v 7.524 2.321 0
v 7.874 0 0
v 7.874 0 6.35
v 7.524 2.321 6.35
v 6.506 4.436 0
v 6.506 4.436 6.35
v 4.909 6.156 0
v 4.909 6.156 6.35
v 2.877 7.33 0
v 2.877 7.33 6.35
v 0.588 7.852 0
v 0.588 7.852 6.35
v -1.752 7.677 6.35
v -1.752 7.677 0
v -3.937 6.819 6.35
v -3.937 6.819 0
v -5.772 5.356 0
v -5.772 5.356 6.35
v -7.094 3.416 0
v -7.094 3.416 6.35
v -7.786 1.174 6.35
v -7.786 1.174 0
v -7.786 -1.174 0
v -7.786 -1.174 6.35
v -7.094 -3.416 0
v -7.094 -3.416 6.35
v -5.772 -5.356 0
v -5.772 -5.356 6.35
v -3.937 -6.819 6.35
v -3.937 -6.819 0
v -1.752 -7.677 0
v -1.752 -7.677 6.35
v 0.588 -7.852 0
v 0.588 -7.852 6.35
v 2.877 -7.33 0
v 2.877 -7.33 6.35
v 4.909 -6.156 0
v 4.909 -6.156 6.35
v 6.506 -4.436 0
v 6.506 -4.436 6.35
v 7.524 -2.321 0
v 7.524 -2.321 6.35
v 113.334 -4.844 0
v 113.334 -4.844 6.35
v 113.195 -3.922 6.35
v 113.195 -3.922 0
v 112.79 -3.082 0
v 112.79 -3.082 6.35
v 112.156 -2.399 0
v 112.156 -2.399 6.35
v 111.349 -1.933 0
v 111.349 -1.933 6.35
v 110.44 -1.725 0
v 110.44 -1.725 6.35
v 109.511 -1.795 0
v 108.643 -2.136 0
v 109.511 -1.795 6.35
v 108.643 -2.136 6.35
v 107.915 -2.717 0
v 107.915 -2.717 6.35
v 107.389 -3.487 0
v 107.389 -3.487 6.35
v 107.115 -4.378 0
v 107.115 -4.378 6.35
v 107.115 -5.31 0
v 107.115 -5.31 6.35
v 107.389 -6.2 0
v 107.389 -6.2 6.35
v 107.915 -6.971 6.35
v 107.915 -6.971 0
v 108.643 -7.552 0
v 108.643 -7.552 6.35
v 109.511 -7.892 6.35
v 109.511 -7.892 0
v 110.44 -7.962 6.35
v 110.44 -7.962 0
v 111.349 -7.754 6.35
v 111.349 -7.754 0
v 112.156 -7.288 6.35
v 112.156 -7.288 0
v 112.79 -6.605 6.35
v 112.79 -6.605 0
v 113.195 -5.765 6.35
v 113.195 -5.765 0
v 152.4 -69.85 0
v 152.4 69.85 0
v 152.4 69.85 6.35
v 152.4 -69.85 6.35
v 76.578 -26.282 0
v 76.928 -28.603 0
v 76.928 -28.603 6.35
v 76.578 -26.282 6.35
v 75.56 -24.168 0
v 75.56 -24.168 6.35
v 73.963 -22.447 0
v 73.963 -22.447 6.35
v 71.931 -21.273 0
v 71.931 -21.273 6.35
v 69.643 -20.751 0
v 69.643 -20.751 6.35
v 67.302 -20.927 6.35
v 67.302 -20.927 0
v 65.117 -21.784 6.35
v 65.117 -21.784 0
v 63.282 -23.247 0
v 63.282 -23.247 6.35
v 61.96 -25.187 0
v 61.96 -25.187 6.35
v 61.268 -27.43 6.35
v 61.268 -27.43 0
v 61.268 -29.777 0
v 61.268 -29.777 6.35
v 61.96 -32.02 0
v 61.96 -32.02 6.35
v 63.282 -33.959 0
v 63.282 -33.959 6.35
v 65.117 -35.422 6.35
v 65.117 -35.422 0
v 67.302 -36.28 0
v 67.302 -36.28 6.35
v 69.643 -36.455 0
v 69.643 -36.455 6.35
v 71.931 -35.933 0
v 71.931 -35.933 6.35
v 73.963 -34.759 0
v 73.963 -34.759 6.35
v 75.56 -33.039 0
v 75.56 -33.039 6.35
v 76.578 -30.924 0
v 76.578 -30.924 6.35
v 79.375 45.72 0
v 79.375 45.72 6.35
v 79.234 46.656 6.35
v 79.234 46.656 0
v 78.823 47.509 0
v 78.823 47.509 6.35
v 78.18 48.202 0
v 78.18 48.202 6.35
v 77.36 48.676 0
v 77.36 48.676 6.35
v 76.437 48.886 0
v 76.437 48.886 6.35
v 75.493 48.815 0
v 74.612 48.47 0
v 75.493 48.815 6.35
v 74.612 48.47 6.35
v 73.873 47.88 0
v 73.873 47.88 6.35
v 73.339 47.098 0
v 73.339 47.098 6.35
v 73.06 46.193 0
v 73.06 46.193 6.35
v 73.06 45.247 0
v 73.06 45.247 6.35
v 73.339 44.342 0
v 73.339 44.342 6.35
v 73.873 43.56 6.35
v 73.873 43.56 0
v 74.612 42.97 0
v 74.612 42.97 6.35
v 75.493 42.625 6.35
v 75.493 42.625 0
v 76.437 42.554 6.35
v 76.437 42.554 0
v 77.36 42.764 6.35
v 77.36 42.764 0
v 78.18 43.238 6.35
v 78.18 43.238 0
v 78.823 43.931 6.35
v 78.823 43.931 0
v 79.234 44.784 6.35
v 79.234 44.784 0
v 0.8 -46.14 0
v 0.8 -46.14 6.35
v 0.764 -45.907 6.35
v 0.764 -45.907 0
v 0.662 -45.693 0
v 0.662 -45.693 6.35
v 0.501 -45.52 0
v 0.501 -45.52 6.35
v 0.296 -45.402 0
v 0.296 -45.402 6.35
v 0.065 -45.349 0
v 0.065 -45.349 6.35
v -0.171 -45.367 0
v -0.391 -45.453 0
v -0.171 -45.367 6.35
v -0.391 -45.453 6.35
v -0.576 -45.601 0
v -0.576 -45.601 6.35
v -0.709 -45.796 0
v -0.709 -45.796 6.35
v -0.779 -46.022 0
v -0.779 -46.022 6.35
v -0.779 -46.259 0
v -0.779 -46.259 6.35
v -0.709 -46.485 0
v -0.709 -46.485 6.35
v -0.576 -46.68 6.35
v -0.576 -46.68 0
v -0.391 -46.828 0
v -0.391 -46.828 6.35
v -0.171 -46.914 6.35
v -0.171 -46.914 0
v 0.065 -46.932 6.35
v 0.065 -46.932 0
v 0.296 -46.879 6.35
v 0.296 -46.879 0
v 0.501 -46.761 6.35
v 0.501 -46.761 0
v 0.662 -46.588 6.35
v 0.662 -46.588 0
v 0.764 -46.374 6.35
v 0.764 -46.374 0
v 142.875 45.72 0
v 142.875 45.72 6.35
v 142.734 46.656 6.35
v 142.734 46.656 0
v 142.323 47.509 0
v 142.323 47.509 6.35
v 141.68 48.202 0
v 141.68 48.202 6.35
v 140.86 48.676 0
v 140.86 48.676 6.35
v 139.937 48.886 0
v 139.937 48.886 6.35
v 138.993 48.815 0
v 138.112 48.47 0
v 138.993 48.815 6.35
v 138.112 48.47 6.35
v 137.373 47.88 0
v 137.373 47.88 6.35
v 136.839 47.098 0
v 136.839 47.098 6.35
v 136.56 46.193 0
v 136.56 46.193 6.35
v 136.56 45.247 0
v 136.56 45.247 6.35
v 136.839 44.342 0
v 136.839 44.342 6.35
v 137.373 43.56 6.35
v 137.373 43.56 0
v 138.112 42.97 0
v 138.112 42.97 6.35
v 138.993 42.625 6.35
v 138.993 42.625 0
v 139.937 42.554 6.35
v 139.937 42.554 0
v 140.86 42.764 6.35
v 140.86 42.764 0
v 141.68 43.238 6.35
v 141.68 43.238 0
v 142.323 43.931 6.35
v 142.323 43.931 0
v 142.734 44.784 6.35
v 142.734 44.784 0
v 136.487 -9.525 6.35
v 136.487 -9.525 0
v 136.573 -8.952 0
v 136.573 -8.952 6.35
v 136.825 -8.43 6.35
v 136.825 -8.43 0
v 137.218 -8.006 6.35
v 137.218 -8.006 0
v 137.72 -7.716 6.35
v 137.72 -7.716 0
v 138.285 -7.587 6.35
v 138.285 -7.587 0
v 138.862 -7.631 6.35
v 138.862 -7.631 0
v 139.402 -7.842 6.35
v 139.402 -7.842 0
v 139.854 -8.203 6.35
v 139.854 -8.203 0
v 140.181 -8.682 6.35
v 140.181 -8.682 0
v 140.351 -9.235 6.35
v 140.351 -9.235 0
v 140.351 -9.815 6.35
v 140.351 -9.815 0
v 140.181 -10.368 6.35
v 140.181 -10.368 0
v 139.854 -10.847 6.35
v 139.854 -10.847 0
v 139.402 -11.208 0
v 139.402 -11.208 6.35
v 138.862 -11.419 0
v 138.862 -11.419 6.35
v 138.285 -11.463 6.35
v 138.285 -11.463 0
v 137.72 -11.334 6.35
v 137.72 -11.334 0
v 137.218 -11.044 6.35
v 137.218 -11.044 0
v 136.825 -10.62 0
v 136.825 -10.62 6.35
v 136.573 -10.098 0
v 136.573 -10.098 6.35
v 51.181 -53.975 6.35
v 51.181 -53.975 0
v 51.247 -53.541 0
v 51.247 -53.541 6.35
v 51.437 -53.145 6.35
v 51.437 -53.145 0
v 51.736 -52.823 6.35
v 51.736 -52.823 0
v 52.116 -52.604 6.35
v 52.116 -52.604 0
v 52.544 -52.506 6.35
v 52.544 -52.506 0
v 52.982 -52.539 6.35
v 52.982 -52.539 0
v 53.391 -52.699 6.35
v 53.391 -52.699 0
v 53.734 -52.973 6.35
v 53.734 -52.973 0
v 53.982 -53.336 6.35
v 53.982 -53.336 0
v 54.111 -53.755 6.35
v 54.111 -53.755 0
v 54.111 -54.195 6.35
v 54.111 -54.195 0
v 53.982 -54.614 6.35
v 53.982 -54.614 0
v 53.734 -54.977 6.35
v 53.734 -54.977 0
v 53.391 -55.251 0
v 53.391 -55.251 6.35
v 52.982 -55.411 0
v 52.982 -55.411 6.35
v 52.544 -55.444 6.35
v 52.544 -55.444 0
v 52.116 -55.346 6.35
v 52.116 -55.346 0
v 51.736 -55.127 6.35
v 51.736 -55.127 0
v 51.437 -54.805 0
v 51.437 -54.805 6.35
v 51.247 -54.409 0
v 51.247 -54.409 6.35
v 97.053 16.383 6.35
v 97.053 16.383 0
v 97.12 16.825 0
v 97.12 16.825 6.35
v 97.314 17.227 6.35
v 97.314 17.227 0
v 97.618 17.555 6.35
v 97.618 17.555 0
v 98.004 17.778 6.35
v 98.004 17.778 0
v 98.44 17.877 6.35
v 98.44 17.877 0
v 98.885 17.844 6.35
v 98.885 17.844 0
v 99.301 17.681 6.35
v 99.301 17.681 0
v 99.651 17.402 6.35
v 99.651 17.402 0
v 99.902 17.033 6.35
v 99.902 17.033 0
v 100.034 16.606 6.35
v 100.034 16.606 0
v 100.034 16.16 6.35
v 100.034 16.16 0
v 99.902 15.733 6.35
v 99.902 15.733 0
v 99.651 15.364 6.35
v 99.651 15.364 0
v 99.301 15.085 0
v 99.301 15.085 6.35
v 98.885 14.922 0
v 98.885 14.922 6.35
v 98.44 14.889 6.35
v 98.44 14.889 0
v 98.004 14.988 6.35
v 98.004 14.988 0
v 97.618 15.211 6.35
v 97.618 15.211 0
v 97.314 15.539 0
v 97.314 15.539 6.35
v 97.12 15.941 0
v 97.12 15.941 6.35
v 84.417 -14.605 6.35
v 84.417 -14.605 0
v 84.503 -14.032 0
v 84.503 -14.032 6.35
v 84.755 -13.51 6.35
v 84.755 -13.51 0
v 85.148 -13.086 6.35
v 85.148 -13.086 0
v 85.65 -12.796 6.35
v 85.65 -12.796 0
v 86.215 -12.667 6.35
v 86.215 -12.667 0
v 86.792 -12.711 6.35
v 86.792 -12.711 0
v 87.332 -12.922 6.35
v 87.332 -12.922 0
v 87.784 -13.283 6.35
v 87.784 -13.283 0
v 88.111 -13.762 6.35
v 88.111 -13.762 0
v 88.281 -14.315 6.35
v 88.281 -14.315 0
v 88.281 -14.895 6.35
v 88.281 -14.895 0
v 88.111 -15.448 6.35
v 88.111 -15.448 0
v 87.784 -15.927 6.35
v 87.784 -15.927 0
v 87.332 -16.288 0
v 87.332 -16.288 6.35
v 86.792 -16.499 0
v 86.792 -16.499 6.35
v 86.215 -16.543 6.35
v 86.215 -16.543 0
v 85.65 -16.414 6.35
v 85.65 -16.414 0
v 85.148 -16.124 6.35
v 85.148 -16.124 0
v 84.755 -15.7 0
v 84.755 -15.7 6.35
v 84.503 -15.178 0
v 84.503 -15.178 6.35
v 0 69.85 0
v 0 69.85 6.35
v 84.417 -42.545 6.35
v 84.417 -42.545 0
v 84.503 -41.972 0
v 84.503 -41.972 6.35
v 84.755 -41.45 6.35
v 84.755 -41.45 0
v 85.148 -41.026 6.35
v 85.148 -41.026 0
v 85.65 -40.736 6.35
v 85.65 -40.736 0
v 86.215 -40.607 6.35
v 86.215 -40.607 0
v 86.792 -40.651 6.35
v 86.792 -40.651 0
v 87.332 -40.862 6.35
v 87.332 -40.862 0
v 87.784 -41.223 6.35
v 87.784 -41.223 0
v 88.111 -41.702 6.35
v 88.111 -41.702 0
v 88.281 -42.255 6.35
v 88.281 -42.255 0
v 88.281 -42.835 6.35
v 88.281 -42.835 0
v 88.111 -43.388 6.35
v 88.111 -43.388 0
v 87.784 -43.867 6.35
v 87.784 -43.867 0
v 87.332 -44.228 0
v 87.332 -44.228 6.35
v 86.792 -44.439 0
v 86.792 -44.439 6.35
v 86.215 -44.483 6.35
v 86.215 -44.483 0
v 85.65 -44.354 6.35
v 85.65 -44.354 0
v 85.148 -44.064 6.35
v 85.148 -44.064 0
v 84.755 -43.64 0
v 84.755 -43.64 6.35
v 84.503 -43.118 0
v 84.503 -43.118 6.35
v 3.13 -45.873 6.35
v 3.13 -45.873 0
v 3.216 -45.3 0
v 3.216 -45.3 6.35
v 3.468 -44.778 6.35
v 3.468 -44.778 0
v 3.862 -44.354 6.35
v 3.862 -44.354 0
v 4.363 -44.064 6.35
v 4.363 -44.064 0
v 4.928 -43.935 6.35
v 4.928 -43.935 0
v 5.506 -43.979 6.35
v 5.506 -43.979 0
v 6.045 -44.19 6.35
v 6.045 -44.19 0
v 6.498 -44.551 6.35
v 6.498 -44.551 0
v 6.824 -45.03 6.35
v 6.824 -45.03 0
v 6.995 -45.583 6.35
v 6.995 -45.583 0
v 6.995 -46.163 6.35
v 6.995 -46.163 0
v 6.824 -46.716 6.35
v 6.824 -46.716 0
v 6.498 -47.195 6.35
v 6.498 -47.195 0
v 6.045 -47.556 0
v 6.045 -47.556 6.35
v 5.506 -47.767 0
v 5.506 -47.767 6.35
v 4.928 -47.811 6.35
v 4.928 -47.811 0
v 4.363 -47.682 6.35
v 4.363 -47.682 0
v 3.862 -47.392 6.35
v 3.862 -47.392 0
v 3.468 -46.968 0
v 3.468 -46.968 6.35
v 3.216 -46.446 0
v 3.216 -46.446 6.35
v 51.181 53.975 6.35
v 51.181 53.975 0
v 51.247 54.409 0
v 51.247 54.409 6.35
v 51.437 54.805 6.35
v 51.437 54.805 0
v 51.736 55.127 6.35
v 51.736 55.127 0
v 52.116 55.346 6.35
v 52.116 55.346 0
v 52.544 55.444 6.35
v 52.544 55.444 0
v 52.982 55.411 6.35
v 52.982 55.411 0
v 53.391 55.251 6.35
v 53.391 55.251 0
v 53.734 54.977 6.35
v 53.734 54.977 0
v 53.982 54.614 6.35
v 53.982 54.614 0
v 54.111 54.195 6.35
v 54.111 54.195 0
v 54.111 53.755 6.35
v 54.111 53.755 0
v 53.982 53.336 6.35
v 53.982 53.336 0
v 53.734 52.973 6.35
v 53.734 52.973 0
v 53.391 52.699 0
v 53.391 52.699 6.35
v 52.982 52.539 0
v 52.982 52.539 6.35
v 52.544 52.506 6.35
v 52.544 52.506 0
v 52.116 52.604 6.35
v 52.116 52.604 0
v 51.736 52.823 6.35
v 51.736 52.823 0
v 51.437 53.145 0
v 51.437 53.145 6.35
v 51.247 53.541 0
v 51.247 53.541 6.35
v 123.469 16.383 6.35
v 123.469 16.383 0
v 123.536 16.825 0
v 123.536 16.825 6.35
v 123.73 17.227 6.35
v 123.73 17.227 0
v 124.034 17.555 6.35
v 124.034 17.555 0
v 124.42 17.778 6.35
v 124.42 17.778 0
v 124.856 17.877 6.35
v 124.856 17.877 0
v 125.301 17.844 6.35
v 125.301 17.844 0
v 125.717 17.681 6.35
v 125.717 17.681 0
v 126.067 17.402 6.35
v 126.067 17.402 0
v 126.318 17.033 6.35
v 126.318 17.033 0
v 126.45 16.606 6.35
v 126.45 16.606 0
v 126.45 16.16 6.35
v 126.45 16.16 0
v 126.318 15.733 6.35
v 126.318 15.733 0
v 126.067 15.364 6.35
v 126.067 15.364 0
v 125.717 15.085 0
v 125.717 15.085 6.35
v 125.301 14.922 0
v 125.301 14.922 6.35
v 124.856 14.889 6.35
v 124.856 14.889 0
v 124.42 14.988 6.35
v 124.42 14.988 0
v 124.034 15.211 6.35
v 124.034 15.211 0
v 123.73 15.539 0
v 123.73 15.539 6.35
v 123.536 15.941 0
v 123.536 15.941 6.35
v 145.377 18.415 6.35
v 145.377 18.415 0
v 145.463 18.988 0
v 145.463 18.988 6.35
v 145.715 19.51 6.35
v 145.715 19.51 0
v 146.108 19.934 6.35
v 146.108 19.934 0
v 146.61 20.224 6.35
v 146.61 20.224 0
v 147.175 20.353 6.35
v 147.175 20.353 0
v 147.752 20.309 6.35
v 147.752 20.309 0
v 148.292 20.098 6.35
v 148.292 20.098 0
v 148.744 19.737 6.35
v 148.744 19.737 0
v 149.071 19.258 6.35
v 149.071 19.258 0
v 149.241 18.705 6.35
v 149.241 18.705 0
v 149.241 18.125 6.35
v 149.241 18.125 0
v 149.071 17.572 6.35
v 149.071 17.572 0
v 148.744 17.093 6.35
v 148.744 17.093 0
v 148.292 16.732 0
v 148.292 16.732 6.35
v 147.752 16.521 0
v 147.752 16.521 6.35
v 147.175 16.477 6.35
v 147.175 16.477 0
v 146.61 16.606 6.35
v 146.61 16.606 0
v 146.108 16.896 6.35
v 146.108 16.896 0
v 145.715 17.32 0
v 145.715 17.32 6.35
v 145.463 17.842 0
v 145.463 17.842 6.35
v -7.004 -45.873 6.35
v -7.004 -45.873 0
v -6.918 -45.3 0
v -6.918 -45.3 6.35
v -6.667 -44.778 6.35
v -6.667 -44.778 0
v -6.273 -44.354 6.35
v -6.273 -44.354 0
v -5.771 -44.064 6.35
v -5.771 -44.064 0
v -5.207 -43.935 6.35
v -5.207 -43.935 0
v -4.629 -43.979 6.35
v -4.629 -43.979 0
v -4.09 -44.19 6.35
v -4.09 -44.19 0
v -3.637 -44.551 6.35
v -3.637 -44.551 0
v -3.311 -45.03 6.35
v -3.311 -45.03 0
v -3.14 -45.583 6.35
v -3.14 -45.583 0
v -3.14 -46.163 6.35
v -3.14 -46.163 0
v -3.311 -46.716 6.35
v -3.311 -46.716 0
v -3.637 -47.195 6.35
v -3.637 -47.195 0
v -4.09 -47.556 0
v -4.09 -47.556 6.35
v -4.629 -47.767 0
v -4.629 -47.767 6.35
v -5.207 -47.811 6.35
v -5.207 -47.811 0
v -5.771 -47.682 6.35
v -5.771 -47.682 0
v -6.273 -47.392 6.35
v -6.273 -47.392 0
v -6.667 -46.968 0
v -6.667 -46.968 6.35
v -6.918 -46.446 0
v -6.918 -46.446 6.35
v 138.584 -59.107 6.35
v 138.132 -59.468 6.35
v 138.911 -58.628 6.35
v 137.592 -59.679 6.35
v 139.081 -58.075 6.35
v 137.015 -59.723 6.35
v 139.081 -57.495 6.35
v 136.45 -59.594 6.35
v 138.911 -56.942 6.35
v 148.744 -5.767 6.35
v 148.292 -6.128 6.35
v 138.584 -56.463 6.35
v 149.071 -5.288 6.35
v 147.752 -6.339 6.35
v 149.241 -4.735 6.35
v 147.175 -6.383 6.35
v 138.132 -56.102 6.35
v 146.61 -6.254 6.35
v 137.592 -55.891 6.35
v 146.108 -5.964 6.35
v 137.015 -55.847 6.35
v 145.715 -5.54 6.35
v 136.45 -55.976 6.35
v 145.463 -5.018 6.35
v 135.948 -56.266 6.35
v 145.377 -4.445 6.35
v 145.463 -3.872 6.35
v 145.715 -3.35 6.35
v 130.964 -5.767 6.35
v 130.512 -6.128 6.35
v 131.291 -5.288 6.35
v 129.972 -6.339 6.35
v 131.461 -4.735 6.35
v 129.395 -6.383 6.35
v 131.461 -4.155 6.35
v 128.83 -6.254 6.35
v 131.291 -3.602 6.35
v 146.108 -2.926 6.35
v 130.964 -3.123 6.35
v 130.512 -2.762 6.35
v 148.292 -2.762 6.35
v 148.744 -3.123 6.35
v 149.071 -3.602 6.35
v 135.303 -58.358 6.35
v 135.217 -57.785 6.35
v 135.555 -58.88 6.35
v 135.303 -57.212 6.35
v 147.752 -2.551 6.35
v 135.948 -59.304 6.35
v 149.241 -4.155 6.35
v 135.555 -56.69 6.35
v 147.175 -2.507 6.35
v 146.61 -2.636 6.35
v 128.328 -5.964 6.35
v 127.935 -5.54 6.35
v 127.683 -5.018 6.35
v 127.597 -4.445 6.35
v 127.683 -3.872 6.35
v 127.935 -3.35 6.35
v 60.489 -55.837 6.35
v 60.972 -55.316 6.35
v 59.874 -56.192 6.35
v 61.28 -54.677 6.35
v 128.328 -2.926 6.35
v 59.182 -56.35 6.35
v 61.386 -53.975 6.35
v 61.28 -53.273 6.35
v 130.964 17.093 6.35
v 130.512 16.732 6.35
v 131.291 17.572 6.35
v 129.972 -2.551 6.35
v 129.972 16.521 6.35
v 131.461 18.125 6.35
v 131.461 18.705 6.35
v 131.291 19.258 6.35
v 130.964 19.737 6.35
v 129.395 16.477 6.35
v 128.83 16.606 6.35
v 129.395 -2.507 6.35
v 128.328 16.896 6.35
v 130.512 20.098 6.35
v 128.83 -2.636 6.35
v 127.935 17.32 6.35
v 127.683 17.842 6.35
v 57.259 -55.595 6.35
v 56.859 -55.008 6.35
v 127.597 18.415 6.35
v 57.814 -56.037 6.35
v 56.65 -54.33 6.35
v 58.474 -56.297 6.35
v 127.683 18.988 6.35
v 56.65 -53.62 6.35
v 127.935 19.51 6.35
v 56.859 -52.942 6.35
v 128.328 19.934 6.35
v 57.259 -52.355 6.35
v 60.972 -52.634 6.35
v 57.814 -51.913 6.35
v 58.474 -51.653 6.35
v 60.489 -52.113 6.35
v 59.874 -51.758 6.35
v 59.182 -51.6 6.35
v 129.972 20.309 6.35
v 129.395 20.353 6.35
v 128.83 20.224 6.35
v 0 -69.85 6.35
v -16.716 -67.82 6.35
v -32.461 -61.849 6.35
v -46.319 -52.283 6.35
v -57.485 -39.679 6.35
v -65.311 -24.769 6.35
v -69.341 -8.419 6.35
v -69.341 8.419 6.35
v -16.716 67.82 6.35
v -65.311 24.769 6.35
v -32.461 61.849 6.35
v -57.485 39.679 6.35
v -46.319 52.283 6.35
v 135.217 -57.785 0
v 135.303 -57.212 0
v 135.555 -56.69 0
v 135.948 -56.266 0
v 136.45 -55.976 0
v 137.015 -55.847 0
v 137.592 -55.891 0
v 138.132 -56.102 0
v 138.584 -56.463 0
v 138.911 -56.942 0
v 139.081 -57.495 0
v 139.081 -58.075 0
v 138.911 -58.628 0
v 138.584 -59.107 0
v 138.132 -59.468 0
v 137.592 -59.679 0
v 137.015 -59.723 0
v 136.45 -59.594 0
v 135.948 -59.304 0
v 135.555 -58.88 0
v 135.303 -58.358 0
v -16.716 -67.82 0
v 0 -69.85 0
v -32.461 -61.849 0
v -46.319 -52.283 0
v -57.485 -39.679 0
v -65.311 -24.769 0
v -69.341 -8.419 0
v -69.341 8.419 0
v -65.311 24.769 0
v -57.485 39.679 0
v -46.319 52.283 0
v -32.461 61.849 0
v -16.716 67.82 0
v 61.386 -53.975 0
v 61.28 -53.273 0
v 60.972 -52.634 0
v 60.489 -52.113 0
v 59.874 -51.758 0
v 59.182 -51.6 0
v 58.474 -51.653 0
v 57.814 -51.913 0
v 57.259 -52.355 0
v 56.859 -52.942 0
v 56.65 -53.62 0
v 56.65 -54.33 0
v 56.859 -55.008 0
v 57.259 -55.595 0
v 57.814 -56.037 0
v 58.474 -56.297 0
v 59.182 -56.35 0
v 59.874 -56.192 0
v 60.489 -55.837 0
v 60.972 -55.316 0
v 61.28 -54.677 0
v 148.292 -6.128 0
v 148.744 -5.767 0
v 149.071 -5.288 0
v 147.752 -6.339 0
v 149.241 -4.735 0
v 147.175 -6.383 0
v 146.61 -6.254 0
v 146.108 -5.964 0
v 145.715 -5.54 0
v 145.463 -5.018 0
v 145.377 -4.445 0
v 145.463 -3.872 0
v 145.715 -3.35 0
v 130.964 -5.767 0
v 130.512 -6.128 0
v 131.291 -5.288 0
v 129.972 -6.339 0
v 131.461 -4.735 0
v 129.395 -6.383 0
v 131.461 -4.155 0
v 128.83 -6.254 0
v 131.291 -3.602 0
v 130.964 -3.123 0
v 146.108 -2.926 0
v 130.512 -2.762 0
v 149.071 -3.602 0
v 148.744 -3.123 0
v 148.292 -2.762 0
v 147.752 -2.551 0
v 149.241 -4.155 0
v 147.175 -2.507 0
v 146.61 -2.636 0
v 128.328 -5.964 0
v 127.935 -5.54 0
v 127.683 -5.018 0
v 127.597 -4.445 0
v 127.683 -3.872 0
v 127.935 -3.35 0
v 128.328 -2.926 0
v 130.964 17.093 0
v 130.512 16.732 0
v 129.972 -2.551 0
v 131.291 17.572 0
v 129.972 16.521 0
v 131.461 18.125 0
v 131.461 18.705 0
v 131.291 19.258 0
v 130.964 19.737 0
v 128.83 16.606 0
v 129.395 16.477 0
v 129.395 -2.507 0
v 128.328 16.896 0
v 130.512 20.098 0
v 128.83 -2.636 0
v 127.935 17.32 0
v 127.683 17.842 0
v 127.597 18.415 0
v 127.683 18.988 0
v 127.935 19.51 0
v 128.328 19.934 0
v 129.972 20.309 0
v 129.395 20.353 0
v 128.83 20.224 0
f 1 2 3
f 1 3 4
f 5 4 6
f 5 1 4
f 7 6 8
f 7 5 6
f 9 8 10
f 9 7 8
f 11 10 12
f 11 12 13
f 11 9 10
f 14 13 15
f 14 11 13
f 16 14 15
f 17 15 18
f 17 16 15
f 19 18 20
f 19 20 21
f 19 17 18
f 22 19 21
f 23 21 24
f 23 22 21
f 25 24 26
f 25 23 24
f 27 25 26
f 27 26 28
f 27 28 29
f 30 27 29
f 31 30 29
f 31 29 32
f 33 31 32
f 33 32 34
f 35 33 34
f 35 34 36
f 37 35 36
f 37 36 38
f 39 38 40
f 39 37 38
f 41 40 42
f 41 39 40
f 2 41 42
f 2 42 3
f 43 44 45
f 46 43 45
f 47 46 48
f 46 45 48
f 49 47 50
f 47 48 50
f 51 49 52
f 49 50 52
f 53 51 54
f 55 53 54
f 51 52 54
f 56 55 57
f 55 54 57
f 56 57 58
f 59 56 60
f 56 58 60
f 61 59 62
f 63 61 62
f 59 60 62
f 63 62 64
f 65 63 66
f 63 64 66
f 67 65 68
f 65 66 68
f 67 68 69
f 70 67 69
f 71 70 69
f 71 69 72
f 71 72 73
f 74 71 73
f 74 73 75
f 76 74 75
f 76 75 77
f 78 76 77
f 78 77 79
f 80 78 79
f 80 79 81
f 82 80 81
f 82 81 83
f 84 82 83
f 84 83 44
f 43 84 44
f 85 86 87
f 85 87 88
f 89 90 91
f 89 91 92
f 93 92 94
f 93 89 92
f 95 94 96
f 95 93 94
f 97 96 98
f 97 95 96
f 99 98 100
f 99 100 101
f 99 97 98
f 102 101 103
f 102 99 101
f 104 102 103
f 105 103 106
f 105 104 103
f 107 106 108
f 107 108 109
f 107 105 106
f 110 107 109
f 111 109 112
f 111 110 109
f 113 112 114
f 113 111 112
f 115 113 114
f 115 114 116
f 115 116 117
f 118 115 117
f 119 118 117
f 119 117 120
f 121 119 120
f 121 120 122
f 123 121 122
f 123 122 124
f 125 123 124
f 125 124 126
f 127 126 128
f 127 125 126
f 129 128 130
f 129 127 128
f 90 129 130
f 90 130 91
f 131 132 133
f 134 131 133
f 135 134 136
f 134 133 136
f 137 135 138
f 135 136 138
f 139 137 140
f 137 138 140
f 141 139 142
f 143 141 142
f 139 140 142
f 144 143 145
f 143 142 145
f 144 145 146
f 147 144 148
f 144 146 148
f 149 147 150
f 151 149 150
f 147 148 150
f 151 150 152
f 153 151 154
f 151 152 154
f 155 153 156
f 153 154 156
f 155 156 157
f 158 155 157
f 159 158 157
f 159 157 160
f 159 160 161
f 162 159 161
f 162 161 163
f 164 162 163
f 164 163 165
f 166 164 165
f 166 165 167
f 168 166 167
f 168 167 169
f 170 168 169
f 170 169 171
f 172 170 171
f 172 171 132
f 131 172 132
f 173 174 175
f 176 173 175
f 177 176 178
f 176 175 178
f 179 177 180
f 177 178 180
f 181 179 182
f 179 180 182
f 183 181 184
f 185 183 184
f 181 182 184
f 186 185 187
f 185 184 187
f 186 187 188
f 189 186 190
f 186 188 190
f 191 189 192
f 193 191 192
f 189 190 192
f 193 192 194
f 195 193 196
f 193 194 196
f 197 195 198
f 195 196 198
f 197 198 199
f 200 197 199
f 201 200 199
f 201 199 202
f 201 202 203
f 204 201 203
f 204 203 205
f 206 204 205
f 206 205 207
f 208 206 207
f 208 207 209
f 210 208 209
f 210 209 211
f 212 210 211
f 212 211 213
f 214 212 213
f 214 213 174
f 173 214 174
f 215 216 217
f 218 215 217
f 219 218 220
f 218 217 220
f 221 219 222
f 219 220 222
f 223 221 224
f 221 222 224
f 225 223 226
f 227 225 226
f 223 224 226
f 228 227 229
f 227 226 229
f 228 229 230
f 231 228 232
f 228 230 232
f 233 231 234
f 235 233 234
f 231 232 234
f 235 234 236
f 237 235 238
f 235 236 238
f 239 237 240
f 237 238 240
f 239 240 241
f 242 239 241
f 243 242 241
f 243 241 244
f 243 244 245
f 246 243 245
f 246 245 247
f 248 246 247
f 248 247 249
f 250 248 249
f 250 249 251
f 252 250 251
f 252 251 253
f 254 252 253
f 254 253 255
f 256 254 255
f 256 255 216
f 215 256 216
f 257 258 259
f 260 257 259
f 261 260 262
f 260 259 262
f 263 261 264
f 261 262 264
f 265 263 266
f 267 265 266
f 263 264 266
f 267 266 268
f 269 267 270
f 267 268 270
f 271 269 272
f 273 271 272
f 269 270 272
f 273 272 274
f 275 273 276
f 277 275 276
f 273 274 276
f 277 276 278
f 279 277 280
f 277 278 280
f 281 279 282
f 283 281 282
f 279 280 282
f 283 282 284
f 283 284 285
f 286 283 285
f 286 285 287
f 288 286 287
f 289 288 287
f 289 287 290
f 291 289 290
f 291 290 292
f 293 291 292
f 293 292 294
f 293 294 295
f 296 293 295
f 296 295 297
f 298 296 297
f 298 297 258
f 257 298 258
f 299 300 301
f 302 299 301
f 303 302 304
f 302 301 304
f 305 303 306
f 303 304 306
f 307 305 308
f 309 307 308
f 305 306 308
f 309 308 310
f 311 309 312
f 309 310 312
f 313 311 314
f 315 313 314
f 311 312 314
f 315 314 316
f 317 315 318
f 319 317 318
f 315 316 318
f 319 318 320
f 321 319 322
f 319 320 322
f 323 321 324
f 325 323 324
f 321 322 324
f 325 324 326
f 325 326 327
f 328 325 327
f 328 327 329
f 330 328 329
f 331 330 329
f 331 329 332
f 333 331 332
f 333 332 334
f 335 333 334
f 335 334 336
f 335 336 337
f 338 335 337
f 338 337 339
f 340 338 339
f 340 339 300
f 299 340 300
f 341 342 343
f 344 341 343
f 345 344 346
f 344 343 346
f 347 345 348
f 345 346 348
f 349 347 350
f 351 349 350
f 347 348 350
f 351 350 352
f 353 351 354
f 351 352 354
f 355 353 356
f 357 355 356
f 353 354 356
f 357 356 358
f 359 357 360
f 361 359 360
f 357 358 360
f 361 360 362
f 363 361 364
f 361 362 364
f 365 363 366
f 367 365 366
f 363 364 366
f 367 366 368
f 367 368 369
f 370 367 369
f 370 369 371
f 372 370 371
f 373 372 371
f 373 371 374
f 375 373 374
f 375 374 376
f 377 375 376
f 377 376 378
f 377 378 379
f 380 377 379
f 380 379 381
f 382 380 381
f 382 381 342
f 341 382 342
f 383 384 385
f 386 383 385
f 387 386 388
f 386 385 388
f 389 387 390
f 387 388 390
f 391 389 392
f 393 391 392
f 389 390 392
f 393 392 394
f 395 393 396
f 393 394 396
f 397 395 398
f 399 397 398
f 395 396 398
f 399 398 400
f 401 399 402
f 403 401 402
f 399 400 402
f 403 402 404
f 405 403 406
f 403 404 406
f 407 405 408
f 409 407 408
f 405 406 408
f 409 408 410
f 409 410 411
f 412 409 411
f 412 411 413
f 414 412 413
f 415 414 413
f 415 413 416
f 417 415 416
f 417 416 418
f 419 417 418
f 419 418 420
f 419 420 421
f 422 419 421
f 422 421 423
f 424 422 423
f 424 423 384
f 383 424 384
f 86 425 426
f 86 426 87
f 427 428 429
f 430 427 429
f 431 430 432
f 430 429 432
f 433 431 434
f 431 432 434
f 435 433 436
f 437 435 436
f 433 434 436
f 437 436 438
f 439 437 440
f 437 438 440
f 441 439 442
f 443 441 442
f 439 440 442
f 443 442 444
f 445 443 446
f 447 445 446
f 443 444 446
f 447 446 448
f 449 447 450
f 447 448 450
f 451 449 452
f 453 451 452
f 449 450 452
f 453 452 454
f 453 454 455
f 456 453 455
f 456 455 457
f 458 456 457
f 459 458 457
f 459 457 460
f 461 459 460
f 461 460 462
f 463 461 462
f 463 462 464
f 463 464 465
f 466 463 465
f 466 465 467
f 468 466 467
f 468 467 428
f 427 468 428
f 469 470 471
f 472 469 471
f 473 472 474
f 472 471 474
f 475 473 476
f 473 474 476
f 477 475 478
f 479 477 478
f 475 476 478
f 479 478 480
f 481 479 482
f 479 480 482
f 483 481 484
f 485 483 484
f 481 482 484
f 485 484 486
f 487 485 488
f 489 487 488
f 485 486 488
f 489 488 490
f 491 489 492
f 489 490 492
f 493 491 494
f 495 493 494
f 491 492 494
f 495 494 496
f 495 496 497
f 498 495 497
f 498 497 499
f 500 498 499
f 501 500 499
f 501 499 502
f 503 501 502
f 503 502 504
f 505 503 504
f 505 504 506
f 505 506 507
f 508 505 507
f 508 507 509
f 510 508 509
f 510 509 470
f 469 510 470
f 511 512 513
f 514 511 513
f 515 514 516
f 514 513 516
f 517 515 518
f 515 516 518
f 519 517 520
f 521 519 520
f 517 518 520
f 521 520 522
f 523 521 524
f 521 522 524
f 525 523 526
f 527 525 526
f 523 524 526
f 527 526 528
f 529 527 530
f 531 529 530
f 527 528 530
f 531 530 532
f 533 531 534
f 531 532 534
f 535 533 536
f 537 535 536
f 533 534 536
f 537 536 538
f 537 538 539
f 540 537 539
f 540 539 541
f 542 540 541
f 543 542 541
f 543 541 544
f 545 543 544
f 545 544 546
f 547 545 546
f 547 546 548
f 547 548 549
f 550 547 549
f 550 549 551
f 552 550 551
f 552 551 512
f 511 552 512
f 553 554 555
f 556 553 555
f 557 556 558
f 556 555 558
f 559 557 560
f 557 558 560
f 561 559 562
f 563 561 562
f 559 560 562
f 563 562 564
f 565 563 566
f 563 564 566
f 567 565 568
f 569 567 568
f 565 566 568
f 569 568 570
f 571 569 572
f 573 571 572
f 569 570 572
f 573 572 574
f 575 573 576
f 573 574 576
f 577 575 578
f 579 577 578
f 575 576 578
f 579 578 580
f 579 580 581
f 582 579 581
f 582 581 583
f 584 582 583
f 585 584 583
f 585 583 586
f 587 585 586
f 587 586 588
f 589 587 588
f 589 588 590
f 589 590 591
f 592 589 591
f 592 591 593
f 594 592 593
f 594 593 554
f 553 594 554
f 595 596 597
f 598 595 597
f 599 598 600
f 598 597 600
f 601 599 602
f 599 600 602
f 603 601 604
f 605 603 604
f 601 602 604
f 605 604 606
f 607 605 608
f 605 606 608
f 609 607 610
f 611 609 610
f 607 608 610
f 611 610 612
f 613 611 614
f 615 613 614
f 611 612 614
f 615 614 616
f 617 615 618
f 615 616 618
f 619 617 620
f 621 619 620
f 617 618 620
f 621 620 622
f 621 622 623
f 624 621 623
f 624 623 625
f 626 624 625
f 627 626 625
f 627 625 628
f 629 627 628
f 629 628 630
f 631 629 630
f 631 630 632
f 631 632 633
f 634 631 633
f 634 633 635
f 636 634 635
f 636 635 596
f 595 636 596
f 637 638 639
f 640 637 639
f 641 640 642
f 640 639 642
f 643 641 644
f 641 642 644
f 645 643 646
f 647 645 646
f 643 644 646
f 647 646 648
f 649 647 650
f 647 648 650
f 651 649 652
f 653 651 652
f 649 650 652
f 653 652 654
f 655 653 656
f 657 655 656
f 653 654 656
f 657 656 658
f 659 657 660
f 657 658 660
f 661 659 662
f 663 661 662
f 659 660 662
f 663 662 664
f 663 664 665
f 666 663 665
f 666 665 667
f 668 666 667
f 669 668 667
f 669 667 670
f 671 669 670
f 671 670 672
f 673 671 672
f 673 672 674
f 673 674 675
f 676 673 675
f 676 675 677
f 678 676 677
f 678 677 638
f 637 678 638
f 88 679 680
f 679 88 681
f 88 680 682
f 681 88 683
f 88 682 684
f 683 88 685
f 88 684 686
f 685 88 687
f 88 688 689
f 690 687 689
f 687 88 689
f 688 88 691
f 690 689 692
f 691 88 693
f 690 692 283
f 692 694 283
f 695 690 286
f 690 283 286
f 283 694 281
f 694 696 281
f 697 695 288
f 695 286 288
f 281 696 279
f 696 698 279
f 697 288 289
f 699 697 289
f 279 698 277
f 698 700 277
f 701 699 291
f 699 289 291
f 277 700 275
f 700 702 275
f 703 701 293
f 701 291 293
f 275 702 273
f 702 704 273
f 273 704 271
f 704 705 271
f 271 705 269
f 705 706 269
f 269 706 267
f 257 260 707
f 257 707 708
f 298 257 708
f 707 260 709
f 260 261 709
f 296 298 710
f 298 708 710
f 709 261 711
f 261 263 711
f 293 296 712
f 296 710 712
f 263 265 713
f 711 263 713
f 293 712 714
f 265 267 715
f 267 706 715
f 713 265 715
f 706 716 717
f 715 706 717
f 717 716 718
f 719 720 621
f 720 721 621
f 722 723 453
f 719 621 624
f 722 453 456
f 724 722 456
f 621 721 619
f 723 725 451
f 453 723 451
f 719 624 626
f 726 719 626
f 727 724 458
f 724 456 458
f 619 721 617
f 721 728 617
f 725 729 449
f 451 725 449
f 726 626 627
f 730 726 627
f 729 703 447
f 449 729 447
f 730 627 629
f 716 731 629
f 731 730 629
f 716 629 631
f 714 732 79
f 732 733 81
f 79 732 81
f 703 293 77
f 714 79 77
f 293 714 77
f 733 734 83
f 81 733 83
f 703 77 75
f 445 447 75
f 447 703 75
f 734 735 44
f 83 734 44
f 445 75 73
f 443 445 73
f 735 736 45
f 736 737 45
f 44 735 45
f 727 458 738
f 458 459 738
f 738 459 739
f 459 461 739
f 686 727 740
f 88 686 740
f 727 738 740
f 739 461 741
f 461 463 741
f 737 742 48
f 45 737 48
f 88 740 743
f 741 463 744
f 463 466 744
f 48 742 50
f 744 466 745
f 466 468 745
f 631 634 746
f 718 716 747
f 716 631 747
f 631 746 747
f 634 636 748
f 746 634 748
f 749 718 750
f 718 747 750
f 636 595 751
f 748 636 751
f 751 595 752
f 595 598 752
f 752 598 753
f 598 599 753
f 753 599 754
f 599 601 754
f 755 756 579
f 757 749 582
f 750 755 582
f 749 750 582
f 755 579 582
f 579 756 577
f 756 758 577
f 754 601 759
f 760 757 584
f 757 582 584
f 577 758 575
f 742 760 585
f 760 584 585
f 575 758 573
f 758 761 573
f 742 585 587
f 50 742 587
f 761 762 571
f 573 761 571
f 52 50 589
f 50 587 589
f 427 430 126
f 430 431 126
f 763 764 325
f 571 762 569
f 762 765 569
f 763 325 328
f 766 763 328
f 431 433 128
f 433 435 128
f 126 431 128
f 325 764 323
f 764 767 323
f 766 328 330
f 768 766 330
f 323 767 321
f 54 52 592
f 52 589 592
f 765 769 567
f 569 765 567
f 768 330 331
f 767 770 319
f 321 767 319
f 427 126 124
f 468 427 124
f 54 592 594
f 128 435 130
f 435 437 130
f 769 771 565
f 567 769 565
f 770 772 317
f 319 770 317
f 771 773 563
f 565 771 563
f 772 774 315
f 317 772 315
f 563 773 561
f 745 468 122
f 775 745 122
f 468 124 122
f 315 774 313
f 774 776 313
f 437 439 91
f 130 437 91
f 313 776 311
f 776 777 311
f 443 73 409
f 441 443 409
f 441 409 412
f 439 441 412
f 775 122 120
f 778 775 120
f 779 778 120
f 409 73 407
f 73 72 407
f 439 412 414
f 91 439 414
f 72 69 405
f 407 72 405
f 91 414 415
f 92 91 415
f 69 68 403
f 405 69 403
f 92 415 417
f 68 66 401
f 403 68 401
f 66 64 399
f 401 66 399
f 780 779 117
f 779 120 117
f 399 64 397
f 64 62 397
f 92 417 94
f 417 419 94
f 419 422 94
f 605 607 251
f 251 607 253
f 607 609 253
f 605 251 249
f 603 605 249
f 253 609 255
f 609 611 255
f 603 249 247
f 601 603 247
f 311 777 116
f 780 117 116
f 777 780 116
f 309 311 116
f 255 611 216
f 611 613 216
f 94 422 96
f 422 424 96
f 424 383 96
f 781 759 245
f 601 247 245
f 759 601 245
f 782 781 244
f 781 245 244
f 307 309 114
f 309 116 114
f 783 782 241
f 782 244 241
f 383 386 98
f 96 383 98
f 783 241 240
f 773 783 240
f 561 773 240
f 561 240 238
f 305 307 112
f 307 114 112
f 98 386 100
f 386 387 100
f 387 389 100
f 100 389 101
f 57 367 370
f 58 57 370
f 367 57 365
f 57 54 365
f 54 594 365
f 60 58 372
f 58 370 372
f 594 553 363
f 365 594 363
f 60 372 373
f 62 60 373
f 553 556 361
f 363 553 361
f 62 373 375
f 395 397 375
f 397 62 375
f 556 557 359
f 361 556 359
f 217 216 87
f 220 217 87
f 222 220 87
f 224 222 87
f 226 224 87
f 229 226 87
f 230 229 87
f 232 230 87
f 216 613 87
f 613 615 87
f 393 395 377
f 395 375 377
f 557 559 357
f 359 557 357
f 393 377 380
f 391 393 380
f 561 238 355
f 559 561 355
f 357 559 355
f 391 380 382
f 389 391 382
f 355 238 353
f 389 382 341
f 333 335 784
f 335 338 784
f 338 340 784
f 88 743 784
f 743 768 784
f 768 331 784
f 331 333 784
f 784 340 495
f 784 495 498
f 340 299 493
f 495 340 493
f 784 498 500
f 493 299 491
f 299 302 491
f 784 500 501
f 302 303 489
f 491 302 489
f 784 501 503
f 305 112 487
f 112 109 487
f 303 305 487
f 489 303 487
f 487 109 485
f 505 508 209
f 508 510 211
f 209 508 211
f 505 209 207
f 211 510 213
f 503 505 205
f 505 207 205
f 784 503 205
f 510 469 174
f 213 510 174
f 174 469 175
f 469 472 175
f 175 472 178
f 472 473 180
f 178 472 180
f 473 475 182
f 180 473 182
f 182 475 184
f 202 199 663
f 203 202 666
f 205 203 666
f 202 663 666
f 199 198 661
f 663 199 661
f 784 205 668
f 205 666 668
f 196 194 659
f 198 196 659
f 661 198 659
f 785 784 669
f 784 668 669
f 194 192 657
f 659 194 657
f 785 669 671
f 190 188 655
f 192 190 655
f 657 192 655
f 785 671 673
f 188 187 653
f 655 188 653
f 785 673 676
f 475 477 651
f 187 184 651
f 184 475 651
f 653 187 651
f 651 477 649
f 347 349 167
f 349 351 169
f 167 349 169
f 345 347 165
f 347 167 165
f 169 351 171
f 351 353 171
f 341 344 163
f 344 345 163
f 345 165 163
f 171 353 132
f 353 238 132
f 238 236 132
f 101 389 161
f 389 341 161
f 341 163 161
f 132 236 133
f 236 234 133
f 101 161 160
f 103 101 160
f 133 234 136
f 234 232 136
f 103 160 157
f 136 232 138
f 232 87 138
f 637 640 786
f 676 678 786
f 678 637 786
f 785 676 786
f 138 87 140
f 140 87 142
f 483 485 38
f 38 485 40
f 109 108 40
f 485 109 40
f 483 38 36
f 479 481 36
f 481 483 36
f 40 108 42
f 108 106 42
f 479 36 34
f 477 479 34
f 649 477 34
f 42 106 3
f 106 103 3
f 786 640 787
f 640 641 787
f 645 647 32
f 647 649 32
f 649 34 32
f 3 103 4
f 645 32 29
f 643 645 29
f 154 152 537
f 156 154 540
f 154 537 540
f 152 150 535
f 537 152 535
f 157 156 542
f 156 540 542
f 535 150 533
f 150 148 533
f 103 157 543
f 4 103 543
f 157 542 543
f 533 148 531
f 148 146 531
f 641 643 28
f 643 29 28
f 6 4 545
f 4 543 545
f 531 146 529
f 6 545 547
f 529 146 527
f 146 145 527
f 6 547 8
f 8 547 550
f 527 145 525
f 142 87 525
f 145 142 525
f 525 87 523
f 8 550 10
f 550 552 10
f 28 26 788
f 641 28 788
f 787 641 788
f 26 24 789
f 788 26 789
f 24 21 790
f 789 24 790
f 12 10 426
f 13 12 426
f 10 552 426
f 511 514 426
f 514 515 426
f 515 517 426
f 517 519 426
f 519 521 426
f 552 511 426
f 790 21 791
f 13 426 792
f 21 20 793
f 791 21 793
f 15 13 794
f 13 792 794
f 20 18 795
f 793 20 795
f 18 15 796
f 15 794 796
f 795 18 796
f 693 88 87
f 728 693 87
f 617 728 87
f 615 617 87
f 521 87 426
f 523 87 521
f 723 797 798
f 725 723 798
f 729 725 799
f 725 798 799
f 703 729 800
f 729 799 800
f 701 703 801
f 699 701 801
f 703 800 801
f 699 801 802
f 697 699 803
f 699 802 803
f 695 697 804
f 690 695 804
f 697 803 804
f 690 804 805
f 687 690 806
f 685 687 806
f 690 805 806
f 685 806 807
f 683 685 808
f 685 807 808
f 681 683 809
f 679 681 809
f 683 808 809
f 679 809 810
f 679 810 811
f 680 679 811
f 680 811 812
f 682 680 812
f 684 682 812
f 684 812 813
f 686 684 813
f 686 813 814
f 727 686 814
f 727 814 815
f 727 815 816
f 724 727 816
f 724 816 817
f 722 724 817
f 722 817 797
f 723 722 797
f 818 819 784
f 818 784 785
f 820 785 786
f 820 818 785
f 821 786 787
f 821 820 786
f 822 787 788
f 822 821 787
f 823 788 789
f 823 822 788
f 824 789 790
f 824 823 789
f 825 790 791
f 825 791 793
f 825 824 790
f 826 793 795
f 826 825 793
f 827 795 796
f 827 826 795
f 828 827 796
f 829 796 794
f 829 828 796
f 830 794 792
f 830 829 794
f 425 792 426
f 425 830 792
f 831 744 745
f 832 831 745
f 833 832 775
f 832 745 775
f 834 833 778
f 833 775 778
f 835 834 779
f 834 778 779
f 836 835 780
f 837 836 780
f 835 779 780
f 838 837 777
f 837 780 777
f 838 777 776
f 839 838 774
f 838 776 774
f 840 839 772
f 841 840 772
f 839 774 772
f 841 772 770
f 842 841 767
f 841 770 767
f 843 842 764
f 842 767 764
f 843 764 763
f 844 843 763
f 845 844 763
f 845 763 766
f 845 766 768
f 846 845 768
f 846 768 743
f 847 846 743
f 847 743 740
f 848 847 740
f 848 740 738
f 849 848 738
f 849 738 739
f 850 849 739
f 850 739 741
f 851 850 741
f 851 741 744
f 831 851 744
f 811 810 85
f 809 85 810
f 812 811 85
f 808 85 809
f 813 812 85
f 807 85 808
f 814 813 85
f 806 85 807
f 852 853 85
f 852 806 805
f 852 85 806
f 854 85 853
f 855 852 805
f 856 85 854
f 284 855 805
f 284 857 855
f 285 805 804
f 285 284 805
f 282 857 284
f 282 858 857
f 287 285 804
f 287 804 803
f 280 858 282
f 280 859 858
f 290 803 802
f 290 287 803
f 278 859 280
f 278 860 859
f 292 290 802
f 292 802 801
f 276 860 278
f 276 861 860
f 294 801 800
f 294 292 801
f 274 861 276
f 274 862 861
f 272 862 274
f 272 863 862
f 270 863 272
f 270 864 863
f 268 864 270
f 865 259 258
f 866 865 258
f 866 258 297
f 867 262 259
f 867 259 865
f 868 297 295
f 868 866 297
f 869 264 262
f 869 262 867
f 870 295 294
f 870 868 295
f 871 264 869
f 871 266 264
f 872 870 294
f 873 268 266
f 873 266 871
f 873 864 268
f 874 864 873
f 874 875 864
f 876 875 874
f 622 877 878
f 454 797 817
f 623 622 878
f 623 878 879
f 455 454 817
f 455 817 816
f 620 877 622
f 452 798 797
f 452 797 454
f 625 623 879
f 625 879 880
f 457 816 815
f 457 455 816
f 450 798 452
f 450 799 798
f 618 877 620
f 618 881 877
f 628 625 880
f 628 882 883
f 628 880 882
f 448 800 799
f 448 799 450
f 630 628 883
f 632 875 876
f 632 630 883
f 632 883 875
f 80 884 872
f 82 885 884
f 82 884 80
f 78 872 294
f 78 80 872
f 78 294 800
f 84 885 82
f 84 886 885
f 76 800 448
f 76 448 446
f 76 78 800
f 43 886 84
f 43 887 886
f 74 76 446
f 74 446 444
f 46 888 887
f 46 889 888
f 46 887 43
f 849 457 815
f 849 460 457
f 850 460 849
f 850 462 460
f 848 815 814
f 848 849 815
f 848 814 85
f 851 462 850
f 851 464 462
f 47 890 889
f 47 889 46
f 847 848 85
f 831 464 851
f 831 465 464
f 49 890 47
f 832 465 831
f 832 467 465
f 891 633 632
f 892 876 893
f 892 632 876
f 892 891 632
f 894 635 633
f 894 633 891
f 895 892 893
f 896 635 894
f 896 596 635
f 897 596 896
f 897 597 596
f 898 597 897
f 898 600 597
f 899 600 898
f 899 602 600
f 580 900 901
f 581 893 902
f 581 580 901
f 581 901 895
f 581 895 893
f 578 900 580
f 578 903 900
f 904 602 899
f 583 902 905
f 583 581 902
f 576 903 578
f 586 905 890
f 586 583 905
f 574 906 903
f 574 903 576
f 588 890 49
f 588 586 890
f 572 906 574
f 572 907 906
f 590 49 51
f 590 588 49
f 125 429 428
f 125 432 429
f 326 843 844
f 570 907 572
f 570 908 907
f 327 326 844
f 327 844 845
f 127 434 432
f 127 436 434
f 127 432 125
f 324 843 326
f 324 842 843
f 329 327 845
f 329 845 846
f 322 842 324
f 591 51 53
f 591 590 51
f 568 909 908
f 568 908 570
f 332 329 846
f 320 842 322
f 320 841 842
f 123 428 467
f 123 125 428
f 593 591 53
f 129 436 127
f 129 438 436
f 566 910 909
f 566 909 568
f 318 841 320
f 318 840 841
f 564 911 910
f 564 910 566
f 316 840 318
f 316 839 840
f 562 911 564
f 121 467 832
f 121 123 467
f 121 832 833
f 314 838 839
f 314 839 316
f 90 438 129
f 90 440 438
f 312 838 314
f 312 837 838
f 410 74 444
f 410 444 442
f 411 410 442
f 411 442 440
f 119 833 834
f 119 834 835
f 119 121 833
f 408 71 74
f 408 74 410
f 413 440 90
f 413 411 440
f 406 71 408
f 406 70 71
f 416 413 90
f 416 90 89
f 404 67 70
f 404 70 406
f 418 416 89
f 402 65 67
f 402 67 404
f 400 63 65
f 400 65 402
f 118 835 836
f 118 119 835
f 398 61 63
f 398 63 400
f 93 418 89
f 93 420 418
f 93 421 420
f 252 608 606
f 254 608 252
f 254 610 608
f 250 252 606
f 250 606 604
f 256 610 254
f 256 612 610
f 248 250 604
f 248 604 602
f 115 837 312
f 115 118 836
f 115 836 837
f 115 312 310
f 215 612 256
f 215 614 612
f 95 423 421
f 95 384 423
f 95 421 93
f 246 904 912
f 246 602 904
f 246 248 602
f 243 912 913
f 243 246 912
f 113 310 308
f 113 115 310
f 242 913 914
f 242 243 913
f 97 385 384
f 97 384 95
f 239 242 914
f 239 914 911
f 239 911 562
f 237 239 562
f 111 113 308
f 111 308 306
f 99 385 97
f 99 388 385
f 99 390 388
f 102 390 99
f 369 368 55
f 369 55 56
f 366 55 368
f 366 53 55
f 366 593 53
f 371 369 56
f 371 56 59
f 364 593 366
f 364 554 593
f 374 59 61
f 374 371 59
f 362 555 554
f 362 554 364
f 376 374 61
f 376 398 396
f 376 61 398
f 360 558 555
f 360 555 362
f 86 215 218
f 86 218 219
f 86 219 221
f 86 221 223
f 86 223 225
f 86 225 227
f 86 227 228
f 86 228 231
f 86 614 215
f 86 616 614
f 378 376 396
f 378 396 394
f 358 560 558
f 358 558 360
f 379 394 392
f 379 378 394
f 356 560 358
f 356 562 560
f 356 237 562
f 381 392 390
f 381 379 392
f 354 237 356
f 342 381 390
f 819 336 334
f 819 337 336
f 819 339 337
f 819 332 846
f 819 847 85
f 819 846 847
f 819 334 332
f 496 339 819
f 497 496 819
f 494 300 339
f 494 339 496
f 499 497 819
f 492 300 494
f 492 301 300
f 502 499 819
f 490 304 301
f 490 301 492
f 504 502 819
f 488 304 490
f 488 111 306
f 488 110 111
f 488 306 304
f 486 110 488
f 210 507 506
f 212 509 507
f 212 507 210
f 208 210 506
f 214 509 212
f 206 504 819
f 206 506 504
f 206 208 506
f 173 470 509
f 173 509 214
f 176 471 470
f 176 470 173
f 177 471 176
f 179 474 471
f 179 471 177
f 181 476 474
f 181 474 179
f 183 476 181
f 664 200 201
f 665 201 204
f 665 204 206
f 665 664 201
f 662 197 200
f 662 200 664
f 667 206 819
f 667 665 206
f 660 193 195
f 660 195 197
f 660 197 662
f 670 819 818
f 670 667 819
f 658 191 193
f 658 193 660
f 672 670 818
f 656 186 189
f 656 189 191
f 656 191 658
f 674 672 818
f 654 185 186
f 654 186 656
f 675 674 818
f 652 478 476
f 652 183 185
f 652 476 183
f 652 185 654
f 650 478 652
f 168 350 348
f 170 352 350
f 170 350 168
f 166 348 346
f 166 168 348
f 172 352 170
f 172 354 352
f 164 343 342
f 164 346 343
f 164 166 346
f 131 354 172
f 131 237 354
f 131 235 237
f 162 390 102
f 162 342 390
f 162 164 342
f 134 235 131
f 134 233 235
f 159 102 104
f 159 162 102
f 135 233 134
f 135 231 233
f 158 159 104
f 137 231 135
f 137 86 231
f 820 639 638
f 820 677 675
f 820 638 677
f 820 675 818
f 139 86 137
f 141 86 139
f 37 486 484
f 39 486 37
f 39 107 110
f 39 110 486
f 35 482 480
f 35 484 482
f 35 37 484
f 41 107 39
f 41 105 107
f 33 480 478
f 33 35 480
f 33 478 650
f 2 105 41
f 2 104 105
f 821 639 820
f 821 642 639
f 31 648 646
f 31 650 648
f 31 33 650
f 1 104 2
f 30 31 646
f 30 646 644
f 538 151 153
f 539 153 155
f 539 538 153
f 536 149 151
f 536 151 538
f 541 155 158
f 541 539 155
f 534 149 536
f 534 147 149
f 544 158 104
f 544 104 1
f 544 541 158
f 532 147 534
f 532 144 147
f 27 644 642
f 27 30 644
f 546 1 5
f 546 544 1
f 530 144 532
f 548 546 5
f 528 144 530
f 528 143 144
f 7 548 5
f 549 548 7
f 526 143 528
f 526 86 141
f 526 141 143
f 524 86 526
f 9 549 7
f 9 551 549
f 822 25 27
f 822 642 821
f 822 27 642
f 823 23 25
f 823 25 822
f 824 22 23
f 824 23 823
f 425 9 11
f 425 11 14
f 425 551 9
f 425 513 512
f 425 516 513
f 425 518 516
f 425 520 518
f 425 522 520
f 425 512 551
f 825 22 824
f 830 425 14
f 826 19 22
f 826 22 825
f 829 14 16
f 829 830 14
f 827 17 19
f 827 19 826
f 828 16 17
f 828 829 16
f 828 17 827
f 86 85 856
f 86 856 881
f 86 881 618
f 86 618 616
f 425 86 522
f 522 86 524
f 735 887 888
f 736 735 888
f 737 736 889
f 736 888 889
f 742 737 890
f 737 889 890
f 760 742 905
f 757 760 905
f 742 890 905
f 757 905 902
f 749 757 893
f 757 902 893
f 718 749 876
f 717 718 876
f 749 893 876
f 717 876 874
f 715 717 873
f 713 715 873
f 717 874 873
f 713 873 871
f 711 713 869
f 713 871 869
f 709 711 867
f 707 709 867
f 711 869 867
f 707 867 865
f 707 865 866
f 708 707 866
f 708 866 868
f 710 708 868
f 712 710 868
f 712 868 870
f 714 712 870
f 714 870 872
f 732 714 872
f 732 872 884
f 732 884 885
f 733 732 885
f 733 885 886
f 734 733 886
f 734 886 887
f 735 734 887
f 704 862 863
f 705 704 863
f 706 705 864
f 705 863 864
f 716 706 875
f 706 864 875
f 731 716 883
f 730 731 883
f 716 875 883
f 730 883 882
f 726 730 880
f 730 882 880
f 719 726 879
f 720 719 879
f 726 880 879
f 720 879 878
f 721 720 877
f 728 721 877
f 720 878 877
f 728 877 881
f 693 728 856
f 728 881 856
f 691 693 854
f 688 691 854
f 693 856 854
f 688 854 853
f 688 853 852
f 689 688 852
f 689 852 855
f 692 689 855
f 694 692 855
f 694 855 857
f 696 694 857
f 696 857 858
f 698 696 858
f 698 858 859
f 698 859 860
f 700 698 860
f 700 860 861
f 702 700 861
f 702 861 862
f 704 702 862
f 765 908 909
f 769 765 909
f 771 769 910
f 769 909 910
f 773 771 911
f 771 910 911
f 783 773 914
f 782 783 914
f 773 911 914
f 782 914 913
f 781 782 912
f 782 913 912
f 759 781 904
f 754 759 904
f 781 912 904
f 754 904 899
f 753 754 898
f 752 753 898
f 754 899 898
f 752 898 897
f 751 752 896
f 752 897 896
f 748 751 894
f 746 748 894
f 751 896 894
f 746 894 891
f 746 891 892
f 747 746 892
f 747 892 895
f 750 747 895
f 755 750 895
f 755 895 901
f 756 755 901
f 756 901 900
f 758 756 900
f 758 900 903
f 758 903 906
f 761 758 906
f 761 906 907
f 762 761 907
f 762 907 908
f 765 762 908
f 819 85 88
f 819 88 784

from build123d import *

# Parameters (mm, degrees)
SKETCH1_R                 = 7.874
BOSS_EXTRUDE1_DEPTH       = 6.35
CUT_EXTRUDE1_REACH        = 8.35
SKETCH2_R                 = 3.175
CUT_EXTRUDE6_REACH        = 8.35
SKETCH8_R                 = 3.127
F_4_CLEARANCE_HOLE1_D     = 2.9464
F_4_CLEARANCE_HOLE1_DEPTH = 6.35
F_4_CLEARANCE_HOLE2_D     = 3.8862
F_4_CLEARANCE_HOLE2_DEPTH = 6.35
CUT_EXTRUDE7_REACH        = 8.35
SKETCH13_R                = 0.79375
CUT_EXTRUDE8_REACH        = 8.35
SKETCH14_R                = 2.38125
F_2_CLEARANCE_HOLE1_D     = 2.9972
F_2_CLEARANCE_HOLE1_DEPTH = 6.35


with BuildPart() as part:
    # Sketch1 → Boss-Extrude1 (new body)
    with BuildSketch(Plane.XY):
        with BuildLine():
            Line((152.4, 69.85), (152.4, -69.85))
            Line((152.4, -69.85), (0, -69.85))
            ThreePointArc((0, -69.85), (-69.85, 0), (0, 69.85))
            Line((0, 69.85), (152.4, 69.85))
        make_face()
        with Locations((69.054102373, -28.60314574)):
            Circle(SKETCH1_R, mode=Mode.SUBTRACT)
        Circle(SKETCH1_R, mode=Mode.SUBTRACT)
    extrude(amount=BOSS_EXTRUDE1_DEPTH)

    # Sketch2 → Cut-Extrude1 (cut, up to next)
    with BuildSketch(Plane.XY.offset(6.35), mode=Mode.PRIVATE) as cut_extrude1_sk1:
        with Locations((76.2, 45.72)):
            Circle(SKETCH2_R)
    cut_extrude1_tool1 = extrude(cut_extrude1_sk1.sketch, amount=-CUT_EXTRUDE1_REACH, mode=Mode.PRIVATE) & part.part
    add(cut_extrude1_tool1.solids().sort_by_distance((76.2, 45.72, 6.35))[0], mode=Mode.SUBTRACT)
    # Sketch2 → Cut-Extrude1 (cut, up to next)
    with BuildSketch(Plane.XY.offset(6.35), mode=Mode.PRIVATE) as cut_extrude1_sk2:
        with Locations((139.7, 45.72)):
            Circle(SKETCH2_R)
    cut_extrude1_tool2 = extrude(cut_extrude1_sk2.sketch, amount=-CUT_EXTRUDE1_REACH, mode=Mode.PRIVATE) & part.part
    add(cut_extrude1_tool2.solids().sort_by_distance((139.7, 45.72, 6.35))[0], mode=Mode.SUBTRACT)

    # Sketch8 → Cut-Extrude6 (cut, up to next)
    with BuildSketch(Plane.XY.offset(6.35), mode=Mode.PRIVATE) as cut_extrude6_sk1:
        with Locations((110.206805808, -4.843621334)):
            Circle(SKETCH8_R)
    cut_extrude6_tool1 = extrude(cut_extrude6_sk1.sketch, amount=-CUT_EXTRUDE6_REACH, mode=Mode.PRIVATE) & part.part
    add(cut_extrude6_tool1.solids().sort_by_distance((110.206806, -4.843621, 6.35))[0], mode=Mode.SUBTRACT)

    # #4 Clearance Hole1
    with Locations(Plane.XY.offset(6.35)):
        with Locations((52.65432584, 53.975), (52.65432584, -53.975)):
            Hole(F_4_CLEARANCE_HOLE1_D / 2, depth=F_4_CLEARANCE_HOLE1_DEPTH)

    # #4 Clearance Hole2
    with Locations(Plane.XY.offset(6.35)):
        with Locations((129.54, 18.415), (147.32, 18.415), (147.32, -4.445), (129.54, -4.445), (138.43, -9.525), (86.36, -14.605), (86.36, -42.545), (137.16, -57.785), (5.073244581, -45.872975683), (-5.061355419, -45.872975683)):
            Hole(F_4_CLEARANCE_HOLE2_D / 2, depth=F_4_CLEARANCE_HOLE2_DEPTH)

    # Sketch13 → Cut-Extrude7 (cut, up to next)
    with BuildSketch(Plane.XY.offset(6.35), mode=Mode.PRIVATE) as cut_extrude7_sk1:
        with Locations((0.005944581, -46.140475683)):
            Circle(SKETCH13_R)
    cut_extrude7_tool1 = extrude(cut_extrude7_sk1.sketch, amount=-CUT_EXTRUDE7_REACH, mode=Mode.PRIVATE) & part.part
    add(cut_extrude7_tool1.solids().sort_by_distance((0.005945, -46.140476, 6.35))[0], mode=Mode.SUBTRACT)

    # Sketch14 → Cut-Extrude8 (cut, up to next)
    with BuildSketch(Plane.XY.offset(6.35), mode=Mode.PRIVATE) as cut_extrude8_sk1:
        with Locations((59.00432584, -53.975)):
            Circle(SKETCH14_R)
    cut_extrude8_tool1 = extrude(cut_extrude8_sk1.sketch, amount=-CUT_EXTRUDE8_REACH, mode=Mode.PRIVATE) & part.part
    add(cut_extrude8_tool1.solids().sort_by_distance((59.004326, -53.975, 6.35))[0], mode=Mode.SUBTRACT)

    # #2 Clearance Hole1
    with Locations(Plane.XY.offset(6.35)):
        with Locations((98.552, 16.383), (124.968, 16.383)):
            Hole(F_2_CLEARANCE_HOLE1_D / 2, depth=F_2_CLEARANCE_HOLE1_DEPTH)


solid = part.part
